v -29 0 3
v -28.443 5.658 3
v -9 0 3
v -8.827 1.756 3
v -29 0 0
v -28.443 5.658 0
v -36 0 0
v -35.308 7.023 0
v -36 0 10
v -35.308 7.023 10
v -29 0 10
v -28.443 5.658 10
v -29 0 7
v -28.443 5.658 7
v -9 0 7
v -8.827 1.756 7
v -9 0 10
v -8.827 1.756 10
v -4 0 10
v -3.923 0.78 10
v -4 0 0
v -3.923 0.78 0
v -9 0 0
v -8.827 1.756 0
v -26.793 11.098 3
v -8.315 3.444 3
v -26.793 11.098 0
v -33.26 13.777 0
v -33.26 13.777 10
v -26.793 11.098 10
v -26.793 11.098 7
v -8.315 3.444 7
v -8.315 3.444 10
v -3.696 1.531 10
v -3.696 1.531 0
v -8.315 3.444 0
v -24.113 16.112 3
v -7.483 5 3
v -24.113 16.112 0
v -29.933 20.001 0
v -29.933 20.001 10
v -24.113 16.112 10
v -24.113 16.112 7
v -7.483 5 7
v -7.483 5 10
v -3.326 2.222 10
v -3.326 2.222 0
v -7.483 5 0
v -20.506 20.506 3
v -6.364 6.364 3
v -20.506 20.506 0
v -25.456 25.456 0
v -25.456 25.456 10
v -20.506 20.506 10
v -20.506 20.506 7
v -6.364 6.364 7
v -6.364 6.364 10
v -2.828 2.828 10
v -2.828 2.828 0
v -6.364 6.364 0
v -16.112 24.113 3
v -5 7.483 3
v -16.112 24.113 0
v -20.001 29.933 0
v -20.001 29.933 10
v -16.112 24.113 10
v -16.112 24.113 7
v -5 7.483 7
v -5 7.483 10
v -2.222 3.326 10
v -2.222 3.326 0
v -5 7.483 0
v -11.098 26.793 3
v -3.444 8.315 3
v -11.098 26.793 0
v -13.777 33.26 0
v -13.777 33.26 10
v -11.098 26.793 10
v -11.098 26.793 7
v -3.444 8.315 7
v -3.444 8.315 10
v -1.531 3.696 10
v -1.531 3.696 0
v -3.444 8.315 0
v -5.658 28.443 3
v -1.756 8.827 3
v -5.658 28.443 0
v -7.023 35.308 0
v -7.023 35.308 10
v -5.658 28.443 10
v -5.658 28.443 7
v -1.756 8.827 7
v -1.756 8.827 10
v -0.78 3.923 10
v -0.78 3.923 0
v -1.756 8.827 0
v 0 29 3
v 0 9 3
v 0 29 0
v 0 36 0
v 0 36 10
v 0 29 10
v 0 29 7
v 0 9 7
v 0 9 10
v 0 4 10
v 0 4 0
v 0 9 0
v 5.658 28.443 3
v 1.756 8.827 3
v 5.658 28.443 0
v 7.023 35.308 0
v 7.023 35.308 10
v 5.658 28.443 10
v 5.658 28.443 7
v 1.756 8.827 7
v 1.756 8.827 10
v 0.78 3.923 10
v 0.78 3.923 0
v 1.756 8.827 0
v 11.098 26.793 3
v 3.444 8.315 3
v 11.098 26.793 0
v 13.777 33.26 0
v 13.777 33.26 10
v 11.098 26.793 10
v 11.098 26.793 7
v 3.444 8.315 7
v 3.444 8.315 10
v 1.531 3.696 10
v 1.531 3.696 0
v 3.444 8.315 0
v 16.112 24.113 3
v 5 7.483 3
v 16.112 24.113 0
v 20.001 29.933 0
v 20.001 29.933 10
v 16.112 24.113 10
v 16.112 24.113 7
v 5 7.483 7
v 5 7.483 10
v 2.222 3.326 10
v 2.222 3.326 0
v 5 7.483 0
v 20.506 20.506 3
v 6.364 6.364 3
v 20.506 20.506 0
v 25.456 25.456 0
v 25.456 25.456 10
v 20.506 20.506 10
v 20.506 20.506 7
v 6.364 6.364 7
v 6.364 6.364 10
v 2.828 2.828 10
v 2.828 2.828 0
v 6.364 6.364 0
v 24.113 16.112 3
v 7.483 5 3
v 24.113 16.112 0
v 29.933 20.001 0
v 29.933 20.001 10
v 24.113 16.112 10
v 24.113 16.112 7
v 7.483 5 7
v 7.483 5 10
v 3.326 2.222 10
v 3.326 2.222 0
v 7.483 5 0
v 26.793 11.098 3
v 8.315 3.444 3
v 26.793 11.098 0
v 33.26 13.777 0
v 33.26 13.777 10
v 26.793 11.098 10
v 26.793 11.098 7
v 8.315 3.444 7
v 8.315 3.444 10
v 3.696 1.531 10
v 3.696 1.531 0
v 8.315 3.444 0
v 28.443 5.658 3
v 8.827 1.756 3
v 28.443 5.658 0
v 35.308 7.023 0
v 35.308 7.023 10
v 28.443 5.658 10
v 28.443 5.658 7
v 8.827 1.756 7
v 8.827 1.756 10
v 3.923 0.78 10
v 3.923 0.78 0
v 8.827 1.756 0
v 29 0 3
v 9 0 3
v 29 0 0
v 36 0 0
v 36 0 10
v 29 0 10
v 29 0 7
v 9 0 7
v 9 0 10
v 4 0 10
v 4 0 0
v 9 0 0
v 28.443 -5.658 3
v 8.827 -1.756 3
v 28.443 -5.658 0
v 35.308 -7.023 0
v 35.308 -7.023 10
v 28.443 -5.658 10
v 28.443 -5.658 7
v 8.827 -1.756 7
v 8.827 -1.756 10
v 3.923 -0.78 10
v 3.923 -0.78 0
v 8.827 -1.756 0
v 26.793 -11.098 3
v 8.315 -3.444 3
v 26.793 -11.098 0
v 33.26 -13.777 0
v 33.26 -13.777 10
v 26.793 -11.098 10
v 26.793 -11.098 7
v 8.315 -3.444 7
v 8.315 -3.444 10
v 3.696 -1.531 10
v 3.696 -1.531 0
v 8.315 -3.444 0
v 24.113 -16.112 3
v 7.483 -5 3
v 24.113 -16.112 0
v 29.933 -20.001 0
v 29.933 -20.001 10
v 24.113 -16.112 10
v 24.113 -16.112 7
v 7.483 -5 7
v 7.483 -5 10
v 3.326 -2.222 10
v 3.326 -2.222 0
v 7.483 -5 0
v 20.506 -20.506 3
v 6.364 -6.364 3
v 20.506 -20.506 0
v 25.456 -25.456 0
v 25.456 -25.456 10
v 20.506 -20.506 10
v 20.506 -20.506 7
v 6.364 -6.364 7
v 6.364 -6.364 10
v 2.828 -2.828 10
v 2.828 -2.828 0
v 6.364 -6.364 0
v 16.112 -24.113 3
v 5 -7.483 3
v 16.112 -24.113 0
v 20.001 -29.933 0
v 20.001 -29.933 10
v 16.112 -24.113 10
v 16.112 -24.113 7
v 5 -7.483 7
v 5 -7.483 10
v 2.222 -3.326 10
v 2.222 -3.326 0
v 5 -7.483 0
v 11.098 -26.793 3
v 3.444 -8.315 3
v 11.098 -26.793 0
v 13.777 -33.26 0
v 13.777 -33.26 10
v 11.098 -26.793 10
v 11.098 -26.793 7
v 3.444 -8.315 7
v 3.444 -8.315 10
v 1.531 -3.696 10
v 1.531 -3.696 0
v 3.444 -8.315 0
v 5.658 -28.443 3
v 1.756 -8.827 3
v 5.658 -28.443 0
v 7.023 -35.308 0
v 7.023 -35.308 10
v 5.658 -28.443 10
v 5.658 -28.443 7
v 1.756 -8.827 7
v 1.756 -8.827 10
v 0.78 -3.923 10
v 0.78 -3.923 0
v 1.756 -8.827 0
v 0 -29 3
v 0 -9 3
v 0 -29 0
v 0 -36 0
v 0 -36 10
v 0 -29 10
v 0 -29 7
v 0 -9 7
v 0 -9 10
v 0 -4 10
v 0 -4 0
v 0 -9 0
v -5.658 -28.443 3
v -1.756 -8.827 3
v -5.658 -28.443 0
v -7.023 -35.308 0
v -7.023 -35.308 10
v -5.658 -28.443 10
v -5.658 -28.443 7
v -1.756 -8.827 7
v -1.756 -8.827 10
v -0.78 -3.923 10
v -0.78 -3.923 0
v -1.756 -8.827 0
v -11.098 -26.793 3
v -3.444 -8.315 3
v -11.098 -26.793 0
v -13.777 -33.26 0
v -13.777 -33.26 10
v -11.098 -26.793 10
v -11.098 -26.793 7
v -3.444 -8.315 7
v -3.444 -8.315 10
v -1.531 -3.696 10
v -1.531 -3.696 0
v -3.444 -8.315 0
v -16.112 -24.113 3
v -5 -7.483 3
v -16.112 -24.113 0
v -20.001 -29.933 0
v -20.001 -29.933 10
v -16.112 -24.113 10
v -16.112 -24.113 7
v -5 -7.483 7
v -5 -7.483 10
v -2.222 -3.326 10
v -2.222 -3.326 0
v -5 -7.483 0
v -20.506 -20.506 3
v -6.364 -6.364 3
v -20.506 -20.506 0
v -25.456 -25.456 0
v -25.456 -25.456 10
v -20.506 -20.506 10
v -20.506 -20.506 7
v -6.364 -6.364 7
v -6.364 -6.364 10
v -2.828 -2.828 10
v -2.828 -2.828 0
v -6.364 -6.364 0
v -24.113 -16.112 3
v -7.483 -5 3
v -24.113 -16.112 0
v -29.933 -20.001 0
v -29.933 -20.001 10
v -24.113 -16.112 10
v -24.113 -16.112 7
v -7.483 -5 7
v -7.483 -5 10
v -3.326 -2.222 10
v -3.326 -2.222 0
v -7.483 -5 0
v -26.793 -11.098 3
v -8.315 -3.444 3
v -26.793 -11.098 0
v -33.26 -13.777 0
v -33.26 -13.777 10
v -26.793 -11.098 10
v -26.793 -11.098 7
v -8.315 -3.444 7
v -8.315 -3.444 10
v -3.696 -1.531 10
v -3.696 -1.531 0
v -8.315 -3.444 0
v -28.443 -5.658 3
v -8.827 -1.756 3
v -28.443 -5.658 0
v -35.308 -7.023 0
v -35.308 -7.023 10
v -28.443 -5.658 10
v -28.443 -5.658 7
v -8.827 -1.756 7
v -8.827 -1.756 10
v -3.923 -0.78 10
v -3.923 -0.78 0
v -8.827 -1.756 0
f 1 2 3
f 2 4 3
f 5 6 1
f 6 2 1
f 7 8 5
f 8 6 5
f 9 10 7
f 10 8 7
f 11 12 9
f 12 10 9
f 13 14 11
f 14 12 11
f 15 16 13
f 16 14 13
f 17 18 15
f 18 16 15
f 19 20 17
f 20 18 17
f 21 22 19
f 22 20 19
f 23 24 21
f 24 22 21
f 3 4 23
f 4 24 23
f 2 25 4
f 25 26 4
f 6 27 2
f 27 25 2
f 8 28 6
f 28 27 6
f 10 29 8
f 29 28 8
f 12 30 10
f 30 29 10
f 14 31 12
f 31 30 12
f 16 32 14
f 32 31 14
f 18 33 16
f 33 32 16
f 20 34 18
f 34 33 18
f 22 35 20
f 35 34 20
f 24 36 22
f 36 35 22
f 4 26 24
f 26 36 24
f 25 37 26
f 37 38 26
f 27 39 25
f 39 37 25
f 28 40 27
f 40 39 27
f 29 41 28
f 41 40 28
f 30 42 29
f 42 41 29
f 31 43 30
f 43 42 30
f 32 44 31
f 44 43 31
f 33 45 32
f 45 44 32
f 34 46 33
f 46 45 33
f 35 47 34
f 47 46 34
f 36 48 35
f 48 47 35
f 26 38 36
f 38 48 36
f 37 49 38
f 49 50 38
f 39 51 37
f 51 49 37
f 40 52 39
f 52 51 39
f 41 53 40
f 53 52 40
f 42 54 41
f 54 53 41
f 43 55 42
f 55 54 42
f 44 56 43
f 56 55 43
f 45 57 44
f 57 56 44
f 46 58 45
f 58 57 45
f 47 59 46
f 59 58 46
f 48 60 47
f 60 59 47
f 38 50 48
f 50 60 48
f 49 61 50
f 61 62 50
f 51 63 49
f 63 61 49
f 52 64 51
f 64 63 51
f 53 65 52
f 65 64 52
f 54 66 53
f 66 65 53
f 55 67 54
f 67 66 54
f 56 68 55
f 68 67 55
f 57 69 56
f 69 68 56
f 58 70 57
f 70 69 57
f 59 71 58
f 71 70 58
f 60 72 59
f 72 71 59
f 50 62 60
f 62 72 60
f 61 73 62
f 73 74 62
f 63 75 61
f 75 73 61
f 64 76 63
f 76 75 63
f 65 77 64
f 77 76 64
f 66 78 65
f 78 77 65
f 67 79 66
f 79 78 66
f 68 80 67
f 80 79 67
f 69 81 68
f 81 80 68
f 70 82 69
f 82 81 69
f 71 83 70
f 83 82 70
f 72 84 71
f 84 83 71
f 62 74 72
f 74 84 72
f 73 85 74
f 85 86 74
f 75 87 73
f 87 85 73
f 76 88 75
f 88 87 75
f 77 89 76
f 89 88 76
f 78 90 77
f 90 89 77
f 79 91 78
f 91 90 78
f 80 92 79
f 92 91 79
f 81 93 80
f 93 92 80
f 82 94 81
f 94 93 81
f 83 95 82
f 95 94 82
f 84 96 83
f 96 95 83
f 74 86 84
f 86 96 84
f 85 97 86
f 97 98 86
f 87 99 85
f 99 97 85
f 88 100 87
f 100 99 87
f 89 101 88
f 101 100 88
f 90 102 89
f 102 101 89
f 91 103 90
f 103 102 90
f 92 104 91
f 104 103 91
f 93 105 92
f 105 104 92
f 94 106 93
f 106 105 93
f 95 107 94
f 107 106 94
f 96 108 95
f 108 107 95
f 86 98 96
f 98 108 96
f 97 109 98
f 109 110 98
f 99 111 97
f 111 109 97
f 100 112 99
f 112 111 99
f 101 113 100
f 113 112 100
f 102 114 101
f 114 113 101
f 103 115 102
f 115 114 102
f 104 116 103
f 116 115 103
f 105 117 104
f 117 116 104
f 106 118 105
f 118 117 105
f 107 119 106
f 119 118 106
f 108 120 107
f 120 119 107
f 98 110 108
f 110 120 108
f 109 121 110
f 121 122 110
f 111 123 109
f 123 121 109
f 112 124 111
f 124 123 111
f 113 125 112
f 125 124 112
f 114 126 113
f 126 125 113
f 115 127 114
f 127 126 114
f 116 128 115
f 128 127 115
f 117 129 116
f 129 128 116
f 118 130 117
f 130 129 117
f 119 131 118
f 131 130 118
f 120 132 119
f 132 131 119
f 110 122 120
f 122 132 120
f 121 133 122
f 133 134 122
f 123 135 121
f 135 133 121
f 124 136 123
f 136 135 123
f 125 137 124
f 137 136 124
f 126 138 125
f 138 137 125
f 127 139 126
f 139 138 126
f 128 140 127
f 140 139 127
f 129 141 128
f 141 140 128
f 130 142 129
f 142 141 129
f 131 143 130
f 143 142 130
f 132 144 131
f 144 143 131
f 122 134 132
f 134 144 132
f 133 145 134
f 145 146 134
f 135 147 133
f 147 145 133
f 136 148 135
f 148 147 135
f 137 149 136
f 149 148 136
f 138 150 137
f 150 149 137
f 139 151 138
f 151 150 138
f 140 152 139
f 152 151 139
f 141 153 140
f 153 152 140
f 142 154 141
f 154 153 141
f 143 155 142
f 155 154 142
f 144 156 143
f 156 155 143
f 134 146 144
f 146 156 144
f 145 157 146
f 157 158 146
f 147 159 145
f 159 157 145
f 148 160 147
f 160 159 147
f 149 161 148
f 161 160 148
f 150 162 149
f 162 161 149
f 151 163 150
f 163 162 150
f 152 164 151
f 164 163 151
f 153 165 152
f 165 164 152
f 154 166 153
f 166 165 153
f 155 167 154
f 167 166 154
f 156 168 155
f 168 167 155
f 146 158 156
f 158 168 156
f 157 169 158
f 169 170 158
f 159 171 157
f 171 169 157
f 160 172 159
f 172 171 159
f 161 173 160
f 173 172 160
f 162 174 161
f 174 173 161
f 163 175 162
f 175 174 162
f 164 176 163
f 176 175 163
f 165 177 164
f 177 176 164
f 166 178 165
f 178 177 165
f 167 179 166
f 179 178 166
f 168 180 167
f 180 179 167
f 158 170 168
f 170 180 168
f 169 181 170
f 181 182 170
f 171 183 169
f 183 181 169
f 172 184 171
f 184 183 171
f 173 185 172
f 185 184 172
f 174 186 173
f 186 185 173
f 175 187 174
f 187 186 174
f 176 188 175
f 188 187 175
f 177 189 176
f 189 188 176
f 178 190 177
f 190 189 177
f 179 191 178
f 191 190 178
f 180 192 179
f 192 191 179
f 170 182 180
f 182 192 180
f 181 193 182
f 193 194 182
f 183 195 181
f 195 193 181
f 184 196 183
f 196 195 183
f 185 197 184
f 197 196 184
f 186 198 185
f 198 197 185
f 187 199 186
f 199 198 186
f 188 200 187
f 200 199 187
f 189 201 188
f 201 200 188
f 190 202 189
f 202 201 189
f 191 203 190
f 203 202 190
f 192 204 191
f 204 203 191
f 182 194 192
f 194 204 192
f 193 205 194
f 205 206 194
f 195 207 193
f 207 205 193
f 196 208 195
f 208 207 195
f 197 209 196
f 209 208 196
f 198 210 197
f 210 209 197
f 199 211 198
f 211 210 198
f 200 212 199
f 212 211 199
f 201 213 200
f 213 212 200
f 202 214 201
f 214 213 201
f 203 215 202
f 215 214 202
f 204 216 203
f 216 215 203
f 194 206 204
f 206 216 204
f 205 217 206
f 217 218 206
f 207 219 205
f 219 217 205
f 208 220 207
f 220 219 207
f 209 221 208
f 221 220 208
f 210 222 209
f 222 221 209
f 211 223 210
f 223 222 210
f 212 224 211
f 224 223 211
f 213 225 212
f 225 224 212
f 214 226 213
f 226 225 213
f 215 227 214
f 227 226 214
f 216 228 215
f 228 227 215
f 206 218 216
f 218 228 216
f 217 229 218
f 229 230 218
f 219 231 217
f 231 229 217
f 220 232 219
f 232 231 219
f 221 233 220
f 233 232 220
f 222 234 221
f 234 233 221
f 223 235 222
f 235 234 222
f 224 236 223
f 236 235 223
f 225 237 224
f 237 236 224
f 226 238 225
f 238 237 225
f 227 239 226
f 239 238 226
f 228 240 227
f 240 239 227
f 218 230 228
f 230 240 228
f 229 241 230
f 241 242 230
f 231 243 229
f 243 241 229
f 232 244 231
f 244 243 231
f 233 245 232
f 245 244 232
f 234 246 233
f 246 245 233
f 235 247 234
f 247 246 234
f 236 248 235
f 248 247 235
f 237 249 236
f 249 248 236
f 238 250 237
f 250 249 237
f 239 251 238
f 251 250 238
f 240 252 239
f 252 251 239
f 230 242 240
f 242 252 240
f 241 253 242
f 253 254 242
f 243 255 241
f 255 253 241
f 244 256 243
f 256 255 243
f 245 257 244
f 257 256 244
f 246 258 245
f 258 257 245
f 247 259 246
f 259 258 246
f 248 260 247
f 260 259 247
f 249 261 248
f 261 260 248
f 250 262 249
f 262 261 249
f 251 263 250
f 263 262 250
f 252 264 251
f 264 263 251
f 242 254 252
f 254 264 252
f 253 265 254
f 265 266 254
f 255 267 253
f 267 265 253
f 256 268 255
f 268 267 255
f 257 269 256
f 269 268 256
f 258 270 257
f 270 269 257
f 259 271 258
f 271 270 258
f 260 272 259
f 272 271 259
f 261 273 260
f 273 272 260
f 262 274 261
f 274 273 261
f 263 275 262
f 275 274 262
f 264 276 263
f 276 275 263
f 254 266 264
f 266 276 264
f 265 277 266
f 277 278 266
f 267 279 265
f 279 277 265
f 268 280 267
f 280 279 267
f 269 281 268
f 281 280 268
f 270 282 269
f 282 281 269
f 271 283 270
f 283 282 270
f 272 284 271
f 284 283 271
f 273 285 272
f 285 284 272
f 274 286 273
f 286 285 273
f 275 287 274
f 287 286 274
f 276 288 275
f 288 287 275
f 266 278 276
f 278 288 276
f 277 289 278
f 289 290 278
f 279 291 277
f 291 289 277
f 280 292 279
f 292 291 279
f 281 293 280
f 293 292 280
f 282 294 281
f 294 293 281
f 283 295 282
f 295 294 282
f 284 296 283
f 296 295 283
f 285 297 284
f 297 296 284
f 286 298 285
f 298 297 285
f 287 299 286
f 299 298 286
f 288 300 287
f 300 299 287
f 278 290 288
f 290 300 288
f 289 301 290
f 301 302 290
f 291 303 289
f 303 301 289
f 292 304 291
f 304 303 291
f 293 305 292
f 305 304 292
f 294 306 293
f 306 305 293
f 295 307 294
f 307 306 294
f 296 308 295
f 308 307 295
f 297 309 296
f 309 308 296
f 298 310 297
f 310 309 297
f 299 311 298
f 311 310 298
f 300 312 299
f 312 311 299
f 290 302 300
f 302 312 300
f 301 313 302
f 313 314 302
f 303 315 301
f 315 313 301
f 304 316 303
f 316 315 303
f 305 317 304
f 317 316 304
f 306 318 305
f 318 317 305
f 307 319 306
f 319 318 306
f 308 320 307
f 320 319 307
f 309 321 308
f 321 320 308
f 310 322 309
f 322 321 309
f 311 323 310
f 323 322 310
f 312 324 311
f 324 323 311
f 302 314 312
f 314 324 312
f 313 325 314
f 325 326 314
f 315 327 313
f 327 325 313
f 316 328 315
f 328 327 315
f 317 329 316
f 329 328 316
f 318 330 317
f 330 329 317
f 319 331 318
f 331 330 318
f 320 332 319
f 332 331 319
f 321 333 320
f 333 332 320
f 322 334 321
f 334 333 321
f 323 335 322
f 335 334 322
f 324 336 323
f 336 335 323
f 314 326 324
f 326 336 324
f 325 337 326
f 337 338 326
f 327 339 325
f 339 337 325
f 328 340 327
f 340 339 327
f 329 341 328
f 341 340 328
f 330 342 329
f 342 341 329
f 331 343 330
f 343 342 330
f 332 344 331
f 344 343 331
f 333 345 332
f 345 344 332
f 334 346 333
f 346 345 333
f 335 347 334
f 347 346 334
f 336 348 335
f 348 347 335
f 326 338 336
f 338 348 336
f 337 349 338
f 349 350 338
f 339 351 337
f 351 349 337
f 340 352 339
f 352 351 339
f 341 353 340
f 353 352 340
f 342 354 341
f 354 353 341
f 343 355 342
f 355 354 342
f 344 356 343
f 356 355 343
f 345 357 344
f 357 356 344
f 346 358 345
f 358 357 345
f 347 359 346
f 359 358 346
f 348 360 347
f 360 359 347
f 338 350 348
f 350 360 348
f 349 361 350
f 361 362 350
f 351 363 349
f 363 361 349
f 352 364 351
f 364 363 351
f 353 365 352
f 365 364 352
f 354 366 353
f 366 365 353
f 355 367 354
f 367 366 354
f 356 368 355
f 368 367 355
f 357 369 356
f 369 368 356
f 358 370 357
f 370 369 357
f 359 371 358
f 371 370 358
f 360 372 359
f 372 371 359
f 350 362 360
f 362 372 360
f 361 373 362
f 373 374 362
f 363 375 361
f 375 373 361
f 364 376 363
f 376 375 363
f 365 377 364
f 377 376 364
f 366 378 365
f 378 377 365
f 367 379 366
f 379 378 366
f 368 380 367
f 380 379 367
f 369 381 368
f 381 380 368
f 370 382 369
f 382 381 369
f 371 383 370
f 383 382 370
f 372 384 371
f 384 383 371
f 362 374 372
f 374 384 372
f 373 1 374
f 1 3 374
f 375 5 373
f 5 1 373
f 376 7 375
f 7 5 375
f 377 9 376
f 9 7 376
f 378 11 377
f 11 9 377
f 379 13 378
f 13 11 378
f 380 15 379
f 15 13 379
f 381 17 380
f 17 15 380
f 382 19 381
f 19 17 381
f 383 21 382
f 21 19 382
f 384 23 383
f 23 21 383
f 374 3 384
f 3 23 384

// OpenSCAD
$fn = 32;

// ----------------------------------------------------------------------
// Revolved part: handwheel R36
// ----------------------------------------------------------------------

// --- parameters (mm) ---
bore_r = 4;               // bore radius
rim_r = 36;               // rim radius
rim_w = 7;                // rim axial width
rim_t = 10;               // rim diameter height
hub_r = 9;                // hub radius
web_t = 4;                // web thickness
revolve_angle = 360;      // revolve sweep, degrees

bore_d = 2 * bore_r;
rim_d = 2 * rim_r;
hub_d = 2 * hub_r;

profile = [[4, 0], [9, 0], [9, 3], [29, 3], [29, 0], [36, 0], [36, 10], [29, 10], [29, 7], [9, 7], [9, 10], [4, 10]];  // primary outline, 12 points, counter clockwise

// --- the one profile operation ---
rotate_extrude(angle = revolve_angle) polygon(points = profile);
